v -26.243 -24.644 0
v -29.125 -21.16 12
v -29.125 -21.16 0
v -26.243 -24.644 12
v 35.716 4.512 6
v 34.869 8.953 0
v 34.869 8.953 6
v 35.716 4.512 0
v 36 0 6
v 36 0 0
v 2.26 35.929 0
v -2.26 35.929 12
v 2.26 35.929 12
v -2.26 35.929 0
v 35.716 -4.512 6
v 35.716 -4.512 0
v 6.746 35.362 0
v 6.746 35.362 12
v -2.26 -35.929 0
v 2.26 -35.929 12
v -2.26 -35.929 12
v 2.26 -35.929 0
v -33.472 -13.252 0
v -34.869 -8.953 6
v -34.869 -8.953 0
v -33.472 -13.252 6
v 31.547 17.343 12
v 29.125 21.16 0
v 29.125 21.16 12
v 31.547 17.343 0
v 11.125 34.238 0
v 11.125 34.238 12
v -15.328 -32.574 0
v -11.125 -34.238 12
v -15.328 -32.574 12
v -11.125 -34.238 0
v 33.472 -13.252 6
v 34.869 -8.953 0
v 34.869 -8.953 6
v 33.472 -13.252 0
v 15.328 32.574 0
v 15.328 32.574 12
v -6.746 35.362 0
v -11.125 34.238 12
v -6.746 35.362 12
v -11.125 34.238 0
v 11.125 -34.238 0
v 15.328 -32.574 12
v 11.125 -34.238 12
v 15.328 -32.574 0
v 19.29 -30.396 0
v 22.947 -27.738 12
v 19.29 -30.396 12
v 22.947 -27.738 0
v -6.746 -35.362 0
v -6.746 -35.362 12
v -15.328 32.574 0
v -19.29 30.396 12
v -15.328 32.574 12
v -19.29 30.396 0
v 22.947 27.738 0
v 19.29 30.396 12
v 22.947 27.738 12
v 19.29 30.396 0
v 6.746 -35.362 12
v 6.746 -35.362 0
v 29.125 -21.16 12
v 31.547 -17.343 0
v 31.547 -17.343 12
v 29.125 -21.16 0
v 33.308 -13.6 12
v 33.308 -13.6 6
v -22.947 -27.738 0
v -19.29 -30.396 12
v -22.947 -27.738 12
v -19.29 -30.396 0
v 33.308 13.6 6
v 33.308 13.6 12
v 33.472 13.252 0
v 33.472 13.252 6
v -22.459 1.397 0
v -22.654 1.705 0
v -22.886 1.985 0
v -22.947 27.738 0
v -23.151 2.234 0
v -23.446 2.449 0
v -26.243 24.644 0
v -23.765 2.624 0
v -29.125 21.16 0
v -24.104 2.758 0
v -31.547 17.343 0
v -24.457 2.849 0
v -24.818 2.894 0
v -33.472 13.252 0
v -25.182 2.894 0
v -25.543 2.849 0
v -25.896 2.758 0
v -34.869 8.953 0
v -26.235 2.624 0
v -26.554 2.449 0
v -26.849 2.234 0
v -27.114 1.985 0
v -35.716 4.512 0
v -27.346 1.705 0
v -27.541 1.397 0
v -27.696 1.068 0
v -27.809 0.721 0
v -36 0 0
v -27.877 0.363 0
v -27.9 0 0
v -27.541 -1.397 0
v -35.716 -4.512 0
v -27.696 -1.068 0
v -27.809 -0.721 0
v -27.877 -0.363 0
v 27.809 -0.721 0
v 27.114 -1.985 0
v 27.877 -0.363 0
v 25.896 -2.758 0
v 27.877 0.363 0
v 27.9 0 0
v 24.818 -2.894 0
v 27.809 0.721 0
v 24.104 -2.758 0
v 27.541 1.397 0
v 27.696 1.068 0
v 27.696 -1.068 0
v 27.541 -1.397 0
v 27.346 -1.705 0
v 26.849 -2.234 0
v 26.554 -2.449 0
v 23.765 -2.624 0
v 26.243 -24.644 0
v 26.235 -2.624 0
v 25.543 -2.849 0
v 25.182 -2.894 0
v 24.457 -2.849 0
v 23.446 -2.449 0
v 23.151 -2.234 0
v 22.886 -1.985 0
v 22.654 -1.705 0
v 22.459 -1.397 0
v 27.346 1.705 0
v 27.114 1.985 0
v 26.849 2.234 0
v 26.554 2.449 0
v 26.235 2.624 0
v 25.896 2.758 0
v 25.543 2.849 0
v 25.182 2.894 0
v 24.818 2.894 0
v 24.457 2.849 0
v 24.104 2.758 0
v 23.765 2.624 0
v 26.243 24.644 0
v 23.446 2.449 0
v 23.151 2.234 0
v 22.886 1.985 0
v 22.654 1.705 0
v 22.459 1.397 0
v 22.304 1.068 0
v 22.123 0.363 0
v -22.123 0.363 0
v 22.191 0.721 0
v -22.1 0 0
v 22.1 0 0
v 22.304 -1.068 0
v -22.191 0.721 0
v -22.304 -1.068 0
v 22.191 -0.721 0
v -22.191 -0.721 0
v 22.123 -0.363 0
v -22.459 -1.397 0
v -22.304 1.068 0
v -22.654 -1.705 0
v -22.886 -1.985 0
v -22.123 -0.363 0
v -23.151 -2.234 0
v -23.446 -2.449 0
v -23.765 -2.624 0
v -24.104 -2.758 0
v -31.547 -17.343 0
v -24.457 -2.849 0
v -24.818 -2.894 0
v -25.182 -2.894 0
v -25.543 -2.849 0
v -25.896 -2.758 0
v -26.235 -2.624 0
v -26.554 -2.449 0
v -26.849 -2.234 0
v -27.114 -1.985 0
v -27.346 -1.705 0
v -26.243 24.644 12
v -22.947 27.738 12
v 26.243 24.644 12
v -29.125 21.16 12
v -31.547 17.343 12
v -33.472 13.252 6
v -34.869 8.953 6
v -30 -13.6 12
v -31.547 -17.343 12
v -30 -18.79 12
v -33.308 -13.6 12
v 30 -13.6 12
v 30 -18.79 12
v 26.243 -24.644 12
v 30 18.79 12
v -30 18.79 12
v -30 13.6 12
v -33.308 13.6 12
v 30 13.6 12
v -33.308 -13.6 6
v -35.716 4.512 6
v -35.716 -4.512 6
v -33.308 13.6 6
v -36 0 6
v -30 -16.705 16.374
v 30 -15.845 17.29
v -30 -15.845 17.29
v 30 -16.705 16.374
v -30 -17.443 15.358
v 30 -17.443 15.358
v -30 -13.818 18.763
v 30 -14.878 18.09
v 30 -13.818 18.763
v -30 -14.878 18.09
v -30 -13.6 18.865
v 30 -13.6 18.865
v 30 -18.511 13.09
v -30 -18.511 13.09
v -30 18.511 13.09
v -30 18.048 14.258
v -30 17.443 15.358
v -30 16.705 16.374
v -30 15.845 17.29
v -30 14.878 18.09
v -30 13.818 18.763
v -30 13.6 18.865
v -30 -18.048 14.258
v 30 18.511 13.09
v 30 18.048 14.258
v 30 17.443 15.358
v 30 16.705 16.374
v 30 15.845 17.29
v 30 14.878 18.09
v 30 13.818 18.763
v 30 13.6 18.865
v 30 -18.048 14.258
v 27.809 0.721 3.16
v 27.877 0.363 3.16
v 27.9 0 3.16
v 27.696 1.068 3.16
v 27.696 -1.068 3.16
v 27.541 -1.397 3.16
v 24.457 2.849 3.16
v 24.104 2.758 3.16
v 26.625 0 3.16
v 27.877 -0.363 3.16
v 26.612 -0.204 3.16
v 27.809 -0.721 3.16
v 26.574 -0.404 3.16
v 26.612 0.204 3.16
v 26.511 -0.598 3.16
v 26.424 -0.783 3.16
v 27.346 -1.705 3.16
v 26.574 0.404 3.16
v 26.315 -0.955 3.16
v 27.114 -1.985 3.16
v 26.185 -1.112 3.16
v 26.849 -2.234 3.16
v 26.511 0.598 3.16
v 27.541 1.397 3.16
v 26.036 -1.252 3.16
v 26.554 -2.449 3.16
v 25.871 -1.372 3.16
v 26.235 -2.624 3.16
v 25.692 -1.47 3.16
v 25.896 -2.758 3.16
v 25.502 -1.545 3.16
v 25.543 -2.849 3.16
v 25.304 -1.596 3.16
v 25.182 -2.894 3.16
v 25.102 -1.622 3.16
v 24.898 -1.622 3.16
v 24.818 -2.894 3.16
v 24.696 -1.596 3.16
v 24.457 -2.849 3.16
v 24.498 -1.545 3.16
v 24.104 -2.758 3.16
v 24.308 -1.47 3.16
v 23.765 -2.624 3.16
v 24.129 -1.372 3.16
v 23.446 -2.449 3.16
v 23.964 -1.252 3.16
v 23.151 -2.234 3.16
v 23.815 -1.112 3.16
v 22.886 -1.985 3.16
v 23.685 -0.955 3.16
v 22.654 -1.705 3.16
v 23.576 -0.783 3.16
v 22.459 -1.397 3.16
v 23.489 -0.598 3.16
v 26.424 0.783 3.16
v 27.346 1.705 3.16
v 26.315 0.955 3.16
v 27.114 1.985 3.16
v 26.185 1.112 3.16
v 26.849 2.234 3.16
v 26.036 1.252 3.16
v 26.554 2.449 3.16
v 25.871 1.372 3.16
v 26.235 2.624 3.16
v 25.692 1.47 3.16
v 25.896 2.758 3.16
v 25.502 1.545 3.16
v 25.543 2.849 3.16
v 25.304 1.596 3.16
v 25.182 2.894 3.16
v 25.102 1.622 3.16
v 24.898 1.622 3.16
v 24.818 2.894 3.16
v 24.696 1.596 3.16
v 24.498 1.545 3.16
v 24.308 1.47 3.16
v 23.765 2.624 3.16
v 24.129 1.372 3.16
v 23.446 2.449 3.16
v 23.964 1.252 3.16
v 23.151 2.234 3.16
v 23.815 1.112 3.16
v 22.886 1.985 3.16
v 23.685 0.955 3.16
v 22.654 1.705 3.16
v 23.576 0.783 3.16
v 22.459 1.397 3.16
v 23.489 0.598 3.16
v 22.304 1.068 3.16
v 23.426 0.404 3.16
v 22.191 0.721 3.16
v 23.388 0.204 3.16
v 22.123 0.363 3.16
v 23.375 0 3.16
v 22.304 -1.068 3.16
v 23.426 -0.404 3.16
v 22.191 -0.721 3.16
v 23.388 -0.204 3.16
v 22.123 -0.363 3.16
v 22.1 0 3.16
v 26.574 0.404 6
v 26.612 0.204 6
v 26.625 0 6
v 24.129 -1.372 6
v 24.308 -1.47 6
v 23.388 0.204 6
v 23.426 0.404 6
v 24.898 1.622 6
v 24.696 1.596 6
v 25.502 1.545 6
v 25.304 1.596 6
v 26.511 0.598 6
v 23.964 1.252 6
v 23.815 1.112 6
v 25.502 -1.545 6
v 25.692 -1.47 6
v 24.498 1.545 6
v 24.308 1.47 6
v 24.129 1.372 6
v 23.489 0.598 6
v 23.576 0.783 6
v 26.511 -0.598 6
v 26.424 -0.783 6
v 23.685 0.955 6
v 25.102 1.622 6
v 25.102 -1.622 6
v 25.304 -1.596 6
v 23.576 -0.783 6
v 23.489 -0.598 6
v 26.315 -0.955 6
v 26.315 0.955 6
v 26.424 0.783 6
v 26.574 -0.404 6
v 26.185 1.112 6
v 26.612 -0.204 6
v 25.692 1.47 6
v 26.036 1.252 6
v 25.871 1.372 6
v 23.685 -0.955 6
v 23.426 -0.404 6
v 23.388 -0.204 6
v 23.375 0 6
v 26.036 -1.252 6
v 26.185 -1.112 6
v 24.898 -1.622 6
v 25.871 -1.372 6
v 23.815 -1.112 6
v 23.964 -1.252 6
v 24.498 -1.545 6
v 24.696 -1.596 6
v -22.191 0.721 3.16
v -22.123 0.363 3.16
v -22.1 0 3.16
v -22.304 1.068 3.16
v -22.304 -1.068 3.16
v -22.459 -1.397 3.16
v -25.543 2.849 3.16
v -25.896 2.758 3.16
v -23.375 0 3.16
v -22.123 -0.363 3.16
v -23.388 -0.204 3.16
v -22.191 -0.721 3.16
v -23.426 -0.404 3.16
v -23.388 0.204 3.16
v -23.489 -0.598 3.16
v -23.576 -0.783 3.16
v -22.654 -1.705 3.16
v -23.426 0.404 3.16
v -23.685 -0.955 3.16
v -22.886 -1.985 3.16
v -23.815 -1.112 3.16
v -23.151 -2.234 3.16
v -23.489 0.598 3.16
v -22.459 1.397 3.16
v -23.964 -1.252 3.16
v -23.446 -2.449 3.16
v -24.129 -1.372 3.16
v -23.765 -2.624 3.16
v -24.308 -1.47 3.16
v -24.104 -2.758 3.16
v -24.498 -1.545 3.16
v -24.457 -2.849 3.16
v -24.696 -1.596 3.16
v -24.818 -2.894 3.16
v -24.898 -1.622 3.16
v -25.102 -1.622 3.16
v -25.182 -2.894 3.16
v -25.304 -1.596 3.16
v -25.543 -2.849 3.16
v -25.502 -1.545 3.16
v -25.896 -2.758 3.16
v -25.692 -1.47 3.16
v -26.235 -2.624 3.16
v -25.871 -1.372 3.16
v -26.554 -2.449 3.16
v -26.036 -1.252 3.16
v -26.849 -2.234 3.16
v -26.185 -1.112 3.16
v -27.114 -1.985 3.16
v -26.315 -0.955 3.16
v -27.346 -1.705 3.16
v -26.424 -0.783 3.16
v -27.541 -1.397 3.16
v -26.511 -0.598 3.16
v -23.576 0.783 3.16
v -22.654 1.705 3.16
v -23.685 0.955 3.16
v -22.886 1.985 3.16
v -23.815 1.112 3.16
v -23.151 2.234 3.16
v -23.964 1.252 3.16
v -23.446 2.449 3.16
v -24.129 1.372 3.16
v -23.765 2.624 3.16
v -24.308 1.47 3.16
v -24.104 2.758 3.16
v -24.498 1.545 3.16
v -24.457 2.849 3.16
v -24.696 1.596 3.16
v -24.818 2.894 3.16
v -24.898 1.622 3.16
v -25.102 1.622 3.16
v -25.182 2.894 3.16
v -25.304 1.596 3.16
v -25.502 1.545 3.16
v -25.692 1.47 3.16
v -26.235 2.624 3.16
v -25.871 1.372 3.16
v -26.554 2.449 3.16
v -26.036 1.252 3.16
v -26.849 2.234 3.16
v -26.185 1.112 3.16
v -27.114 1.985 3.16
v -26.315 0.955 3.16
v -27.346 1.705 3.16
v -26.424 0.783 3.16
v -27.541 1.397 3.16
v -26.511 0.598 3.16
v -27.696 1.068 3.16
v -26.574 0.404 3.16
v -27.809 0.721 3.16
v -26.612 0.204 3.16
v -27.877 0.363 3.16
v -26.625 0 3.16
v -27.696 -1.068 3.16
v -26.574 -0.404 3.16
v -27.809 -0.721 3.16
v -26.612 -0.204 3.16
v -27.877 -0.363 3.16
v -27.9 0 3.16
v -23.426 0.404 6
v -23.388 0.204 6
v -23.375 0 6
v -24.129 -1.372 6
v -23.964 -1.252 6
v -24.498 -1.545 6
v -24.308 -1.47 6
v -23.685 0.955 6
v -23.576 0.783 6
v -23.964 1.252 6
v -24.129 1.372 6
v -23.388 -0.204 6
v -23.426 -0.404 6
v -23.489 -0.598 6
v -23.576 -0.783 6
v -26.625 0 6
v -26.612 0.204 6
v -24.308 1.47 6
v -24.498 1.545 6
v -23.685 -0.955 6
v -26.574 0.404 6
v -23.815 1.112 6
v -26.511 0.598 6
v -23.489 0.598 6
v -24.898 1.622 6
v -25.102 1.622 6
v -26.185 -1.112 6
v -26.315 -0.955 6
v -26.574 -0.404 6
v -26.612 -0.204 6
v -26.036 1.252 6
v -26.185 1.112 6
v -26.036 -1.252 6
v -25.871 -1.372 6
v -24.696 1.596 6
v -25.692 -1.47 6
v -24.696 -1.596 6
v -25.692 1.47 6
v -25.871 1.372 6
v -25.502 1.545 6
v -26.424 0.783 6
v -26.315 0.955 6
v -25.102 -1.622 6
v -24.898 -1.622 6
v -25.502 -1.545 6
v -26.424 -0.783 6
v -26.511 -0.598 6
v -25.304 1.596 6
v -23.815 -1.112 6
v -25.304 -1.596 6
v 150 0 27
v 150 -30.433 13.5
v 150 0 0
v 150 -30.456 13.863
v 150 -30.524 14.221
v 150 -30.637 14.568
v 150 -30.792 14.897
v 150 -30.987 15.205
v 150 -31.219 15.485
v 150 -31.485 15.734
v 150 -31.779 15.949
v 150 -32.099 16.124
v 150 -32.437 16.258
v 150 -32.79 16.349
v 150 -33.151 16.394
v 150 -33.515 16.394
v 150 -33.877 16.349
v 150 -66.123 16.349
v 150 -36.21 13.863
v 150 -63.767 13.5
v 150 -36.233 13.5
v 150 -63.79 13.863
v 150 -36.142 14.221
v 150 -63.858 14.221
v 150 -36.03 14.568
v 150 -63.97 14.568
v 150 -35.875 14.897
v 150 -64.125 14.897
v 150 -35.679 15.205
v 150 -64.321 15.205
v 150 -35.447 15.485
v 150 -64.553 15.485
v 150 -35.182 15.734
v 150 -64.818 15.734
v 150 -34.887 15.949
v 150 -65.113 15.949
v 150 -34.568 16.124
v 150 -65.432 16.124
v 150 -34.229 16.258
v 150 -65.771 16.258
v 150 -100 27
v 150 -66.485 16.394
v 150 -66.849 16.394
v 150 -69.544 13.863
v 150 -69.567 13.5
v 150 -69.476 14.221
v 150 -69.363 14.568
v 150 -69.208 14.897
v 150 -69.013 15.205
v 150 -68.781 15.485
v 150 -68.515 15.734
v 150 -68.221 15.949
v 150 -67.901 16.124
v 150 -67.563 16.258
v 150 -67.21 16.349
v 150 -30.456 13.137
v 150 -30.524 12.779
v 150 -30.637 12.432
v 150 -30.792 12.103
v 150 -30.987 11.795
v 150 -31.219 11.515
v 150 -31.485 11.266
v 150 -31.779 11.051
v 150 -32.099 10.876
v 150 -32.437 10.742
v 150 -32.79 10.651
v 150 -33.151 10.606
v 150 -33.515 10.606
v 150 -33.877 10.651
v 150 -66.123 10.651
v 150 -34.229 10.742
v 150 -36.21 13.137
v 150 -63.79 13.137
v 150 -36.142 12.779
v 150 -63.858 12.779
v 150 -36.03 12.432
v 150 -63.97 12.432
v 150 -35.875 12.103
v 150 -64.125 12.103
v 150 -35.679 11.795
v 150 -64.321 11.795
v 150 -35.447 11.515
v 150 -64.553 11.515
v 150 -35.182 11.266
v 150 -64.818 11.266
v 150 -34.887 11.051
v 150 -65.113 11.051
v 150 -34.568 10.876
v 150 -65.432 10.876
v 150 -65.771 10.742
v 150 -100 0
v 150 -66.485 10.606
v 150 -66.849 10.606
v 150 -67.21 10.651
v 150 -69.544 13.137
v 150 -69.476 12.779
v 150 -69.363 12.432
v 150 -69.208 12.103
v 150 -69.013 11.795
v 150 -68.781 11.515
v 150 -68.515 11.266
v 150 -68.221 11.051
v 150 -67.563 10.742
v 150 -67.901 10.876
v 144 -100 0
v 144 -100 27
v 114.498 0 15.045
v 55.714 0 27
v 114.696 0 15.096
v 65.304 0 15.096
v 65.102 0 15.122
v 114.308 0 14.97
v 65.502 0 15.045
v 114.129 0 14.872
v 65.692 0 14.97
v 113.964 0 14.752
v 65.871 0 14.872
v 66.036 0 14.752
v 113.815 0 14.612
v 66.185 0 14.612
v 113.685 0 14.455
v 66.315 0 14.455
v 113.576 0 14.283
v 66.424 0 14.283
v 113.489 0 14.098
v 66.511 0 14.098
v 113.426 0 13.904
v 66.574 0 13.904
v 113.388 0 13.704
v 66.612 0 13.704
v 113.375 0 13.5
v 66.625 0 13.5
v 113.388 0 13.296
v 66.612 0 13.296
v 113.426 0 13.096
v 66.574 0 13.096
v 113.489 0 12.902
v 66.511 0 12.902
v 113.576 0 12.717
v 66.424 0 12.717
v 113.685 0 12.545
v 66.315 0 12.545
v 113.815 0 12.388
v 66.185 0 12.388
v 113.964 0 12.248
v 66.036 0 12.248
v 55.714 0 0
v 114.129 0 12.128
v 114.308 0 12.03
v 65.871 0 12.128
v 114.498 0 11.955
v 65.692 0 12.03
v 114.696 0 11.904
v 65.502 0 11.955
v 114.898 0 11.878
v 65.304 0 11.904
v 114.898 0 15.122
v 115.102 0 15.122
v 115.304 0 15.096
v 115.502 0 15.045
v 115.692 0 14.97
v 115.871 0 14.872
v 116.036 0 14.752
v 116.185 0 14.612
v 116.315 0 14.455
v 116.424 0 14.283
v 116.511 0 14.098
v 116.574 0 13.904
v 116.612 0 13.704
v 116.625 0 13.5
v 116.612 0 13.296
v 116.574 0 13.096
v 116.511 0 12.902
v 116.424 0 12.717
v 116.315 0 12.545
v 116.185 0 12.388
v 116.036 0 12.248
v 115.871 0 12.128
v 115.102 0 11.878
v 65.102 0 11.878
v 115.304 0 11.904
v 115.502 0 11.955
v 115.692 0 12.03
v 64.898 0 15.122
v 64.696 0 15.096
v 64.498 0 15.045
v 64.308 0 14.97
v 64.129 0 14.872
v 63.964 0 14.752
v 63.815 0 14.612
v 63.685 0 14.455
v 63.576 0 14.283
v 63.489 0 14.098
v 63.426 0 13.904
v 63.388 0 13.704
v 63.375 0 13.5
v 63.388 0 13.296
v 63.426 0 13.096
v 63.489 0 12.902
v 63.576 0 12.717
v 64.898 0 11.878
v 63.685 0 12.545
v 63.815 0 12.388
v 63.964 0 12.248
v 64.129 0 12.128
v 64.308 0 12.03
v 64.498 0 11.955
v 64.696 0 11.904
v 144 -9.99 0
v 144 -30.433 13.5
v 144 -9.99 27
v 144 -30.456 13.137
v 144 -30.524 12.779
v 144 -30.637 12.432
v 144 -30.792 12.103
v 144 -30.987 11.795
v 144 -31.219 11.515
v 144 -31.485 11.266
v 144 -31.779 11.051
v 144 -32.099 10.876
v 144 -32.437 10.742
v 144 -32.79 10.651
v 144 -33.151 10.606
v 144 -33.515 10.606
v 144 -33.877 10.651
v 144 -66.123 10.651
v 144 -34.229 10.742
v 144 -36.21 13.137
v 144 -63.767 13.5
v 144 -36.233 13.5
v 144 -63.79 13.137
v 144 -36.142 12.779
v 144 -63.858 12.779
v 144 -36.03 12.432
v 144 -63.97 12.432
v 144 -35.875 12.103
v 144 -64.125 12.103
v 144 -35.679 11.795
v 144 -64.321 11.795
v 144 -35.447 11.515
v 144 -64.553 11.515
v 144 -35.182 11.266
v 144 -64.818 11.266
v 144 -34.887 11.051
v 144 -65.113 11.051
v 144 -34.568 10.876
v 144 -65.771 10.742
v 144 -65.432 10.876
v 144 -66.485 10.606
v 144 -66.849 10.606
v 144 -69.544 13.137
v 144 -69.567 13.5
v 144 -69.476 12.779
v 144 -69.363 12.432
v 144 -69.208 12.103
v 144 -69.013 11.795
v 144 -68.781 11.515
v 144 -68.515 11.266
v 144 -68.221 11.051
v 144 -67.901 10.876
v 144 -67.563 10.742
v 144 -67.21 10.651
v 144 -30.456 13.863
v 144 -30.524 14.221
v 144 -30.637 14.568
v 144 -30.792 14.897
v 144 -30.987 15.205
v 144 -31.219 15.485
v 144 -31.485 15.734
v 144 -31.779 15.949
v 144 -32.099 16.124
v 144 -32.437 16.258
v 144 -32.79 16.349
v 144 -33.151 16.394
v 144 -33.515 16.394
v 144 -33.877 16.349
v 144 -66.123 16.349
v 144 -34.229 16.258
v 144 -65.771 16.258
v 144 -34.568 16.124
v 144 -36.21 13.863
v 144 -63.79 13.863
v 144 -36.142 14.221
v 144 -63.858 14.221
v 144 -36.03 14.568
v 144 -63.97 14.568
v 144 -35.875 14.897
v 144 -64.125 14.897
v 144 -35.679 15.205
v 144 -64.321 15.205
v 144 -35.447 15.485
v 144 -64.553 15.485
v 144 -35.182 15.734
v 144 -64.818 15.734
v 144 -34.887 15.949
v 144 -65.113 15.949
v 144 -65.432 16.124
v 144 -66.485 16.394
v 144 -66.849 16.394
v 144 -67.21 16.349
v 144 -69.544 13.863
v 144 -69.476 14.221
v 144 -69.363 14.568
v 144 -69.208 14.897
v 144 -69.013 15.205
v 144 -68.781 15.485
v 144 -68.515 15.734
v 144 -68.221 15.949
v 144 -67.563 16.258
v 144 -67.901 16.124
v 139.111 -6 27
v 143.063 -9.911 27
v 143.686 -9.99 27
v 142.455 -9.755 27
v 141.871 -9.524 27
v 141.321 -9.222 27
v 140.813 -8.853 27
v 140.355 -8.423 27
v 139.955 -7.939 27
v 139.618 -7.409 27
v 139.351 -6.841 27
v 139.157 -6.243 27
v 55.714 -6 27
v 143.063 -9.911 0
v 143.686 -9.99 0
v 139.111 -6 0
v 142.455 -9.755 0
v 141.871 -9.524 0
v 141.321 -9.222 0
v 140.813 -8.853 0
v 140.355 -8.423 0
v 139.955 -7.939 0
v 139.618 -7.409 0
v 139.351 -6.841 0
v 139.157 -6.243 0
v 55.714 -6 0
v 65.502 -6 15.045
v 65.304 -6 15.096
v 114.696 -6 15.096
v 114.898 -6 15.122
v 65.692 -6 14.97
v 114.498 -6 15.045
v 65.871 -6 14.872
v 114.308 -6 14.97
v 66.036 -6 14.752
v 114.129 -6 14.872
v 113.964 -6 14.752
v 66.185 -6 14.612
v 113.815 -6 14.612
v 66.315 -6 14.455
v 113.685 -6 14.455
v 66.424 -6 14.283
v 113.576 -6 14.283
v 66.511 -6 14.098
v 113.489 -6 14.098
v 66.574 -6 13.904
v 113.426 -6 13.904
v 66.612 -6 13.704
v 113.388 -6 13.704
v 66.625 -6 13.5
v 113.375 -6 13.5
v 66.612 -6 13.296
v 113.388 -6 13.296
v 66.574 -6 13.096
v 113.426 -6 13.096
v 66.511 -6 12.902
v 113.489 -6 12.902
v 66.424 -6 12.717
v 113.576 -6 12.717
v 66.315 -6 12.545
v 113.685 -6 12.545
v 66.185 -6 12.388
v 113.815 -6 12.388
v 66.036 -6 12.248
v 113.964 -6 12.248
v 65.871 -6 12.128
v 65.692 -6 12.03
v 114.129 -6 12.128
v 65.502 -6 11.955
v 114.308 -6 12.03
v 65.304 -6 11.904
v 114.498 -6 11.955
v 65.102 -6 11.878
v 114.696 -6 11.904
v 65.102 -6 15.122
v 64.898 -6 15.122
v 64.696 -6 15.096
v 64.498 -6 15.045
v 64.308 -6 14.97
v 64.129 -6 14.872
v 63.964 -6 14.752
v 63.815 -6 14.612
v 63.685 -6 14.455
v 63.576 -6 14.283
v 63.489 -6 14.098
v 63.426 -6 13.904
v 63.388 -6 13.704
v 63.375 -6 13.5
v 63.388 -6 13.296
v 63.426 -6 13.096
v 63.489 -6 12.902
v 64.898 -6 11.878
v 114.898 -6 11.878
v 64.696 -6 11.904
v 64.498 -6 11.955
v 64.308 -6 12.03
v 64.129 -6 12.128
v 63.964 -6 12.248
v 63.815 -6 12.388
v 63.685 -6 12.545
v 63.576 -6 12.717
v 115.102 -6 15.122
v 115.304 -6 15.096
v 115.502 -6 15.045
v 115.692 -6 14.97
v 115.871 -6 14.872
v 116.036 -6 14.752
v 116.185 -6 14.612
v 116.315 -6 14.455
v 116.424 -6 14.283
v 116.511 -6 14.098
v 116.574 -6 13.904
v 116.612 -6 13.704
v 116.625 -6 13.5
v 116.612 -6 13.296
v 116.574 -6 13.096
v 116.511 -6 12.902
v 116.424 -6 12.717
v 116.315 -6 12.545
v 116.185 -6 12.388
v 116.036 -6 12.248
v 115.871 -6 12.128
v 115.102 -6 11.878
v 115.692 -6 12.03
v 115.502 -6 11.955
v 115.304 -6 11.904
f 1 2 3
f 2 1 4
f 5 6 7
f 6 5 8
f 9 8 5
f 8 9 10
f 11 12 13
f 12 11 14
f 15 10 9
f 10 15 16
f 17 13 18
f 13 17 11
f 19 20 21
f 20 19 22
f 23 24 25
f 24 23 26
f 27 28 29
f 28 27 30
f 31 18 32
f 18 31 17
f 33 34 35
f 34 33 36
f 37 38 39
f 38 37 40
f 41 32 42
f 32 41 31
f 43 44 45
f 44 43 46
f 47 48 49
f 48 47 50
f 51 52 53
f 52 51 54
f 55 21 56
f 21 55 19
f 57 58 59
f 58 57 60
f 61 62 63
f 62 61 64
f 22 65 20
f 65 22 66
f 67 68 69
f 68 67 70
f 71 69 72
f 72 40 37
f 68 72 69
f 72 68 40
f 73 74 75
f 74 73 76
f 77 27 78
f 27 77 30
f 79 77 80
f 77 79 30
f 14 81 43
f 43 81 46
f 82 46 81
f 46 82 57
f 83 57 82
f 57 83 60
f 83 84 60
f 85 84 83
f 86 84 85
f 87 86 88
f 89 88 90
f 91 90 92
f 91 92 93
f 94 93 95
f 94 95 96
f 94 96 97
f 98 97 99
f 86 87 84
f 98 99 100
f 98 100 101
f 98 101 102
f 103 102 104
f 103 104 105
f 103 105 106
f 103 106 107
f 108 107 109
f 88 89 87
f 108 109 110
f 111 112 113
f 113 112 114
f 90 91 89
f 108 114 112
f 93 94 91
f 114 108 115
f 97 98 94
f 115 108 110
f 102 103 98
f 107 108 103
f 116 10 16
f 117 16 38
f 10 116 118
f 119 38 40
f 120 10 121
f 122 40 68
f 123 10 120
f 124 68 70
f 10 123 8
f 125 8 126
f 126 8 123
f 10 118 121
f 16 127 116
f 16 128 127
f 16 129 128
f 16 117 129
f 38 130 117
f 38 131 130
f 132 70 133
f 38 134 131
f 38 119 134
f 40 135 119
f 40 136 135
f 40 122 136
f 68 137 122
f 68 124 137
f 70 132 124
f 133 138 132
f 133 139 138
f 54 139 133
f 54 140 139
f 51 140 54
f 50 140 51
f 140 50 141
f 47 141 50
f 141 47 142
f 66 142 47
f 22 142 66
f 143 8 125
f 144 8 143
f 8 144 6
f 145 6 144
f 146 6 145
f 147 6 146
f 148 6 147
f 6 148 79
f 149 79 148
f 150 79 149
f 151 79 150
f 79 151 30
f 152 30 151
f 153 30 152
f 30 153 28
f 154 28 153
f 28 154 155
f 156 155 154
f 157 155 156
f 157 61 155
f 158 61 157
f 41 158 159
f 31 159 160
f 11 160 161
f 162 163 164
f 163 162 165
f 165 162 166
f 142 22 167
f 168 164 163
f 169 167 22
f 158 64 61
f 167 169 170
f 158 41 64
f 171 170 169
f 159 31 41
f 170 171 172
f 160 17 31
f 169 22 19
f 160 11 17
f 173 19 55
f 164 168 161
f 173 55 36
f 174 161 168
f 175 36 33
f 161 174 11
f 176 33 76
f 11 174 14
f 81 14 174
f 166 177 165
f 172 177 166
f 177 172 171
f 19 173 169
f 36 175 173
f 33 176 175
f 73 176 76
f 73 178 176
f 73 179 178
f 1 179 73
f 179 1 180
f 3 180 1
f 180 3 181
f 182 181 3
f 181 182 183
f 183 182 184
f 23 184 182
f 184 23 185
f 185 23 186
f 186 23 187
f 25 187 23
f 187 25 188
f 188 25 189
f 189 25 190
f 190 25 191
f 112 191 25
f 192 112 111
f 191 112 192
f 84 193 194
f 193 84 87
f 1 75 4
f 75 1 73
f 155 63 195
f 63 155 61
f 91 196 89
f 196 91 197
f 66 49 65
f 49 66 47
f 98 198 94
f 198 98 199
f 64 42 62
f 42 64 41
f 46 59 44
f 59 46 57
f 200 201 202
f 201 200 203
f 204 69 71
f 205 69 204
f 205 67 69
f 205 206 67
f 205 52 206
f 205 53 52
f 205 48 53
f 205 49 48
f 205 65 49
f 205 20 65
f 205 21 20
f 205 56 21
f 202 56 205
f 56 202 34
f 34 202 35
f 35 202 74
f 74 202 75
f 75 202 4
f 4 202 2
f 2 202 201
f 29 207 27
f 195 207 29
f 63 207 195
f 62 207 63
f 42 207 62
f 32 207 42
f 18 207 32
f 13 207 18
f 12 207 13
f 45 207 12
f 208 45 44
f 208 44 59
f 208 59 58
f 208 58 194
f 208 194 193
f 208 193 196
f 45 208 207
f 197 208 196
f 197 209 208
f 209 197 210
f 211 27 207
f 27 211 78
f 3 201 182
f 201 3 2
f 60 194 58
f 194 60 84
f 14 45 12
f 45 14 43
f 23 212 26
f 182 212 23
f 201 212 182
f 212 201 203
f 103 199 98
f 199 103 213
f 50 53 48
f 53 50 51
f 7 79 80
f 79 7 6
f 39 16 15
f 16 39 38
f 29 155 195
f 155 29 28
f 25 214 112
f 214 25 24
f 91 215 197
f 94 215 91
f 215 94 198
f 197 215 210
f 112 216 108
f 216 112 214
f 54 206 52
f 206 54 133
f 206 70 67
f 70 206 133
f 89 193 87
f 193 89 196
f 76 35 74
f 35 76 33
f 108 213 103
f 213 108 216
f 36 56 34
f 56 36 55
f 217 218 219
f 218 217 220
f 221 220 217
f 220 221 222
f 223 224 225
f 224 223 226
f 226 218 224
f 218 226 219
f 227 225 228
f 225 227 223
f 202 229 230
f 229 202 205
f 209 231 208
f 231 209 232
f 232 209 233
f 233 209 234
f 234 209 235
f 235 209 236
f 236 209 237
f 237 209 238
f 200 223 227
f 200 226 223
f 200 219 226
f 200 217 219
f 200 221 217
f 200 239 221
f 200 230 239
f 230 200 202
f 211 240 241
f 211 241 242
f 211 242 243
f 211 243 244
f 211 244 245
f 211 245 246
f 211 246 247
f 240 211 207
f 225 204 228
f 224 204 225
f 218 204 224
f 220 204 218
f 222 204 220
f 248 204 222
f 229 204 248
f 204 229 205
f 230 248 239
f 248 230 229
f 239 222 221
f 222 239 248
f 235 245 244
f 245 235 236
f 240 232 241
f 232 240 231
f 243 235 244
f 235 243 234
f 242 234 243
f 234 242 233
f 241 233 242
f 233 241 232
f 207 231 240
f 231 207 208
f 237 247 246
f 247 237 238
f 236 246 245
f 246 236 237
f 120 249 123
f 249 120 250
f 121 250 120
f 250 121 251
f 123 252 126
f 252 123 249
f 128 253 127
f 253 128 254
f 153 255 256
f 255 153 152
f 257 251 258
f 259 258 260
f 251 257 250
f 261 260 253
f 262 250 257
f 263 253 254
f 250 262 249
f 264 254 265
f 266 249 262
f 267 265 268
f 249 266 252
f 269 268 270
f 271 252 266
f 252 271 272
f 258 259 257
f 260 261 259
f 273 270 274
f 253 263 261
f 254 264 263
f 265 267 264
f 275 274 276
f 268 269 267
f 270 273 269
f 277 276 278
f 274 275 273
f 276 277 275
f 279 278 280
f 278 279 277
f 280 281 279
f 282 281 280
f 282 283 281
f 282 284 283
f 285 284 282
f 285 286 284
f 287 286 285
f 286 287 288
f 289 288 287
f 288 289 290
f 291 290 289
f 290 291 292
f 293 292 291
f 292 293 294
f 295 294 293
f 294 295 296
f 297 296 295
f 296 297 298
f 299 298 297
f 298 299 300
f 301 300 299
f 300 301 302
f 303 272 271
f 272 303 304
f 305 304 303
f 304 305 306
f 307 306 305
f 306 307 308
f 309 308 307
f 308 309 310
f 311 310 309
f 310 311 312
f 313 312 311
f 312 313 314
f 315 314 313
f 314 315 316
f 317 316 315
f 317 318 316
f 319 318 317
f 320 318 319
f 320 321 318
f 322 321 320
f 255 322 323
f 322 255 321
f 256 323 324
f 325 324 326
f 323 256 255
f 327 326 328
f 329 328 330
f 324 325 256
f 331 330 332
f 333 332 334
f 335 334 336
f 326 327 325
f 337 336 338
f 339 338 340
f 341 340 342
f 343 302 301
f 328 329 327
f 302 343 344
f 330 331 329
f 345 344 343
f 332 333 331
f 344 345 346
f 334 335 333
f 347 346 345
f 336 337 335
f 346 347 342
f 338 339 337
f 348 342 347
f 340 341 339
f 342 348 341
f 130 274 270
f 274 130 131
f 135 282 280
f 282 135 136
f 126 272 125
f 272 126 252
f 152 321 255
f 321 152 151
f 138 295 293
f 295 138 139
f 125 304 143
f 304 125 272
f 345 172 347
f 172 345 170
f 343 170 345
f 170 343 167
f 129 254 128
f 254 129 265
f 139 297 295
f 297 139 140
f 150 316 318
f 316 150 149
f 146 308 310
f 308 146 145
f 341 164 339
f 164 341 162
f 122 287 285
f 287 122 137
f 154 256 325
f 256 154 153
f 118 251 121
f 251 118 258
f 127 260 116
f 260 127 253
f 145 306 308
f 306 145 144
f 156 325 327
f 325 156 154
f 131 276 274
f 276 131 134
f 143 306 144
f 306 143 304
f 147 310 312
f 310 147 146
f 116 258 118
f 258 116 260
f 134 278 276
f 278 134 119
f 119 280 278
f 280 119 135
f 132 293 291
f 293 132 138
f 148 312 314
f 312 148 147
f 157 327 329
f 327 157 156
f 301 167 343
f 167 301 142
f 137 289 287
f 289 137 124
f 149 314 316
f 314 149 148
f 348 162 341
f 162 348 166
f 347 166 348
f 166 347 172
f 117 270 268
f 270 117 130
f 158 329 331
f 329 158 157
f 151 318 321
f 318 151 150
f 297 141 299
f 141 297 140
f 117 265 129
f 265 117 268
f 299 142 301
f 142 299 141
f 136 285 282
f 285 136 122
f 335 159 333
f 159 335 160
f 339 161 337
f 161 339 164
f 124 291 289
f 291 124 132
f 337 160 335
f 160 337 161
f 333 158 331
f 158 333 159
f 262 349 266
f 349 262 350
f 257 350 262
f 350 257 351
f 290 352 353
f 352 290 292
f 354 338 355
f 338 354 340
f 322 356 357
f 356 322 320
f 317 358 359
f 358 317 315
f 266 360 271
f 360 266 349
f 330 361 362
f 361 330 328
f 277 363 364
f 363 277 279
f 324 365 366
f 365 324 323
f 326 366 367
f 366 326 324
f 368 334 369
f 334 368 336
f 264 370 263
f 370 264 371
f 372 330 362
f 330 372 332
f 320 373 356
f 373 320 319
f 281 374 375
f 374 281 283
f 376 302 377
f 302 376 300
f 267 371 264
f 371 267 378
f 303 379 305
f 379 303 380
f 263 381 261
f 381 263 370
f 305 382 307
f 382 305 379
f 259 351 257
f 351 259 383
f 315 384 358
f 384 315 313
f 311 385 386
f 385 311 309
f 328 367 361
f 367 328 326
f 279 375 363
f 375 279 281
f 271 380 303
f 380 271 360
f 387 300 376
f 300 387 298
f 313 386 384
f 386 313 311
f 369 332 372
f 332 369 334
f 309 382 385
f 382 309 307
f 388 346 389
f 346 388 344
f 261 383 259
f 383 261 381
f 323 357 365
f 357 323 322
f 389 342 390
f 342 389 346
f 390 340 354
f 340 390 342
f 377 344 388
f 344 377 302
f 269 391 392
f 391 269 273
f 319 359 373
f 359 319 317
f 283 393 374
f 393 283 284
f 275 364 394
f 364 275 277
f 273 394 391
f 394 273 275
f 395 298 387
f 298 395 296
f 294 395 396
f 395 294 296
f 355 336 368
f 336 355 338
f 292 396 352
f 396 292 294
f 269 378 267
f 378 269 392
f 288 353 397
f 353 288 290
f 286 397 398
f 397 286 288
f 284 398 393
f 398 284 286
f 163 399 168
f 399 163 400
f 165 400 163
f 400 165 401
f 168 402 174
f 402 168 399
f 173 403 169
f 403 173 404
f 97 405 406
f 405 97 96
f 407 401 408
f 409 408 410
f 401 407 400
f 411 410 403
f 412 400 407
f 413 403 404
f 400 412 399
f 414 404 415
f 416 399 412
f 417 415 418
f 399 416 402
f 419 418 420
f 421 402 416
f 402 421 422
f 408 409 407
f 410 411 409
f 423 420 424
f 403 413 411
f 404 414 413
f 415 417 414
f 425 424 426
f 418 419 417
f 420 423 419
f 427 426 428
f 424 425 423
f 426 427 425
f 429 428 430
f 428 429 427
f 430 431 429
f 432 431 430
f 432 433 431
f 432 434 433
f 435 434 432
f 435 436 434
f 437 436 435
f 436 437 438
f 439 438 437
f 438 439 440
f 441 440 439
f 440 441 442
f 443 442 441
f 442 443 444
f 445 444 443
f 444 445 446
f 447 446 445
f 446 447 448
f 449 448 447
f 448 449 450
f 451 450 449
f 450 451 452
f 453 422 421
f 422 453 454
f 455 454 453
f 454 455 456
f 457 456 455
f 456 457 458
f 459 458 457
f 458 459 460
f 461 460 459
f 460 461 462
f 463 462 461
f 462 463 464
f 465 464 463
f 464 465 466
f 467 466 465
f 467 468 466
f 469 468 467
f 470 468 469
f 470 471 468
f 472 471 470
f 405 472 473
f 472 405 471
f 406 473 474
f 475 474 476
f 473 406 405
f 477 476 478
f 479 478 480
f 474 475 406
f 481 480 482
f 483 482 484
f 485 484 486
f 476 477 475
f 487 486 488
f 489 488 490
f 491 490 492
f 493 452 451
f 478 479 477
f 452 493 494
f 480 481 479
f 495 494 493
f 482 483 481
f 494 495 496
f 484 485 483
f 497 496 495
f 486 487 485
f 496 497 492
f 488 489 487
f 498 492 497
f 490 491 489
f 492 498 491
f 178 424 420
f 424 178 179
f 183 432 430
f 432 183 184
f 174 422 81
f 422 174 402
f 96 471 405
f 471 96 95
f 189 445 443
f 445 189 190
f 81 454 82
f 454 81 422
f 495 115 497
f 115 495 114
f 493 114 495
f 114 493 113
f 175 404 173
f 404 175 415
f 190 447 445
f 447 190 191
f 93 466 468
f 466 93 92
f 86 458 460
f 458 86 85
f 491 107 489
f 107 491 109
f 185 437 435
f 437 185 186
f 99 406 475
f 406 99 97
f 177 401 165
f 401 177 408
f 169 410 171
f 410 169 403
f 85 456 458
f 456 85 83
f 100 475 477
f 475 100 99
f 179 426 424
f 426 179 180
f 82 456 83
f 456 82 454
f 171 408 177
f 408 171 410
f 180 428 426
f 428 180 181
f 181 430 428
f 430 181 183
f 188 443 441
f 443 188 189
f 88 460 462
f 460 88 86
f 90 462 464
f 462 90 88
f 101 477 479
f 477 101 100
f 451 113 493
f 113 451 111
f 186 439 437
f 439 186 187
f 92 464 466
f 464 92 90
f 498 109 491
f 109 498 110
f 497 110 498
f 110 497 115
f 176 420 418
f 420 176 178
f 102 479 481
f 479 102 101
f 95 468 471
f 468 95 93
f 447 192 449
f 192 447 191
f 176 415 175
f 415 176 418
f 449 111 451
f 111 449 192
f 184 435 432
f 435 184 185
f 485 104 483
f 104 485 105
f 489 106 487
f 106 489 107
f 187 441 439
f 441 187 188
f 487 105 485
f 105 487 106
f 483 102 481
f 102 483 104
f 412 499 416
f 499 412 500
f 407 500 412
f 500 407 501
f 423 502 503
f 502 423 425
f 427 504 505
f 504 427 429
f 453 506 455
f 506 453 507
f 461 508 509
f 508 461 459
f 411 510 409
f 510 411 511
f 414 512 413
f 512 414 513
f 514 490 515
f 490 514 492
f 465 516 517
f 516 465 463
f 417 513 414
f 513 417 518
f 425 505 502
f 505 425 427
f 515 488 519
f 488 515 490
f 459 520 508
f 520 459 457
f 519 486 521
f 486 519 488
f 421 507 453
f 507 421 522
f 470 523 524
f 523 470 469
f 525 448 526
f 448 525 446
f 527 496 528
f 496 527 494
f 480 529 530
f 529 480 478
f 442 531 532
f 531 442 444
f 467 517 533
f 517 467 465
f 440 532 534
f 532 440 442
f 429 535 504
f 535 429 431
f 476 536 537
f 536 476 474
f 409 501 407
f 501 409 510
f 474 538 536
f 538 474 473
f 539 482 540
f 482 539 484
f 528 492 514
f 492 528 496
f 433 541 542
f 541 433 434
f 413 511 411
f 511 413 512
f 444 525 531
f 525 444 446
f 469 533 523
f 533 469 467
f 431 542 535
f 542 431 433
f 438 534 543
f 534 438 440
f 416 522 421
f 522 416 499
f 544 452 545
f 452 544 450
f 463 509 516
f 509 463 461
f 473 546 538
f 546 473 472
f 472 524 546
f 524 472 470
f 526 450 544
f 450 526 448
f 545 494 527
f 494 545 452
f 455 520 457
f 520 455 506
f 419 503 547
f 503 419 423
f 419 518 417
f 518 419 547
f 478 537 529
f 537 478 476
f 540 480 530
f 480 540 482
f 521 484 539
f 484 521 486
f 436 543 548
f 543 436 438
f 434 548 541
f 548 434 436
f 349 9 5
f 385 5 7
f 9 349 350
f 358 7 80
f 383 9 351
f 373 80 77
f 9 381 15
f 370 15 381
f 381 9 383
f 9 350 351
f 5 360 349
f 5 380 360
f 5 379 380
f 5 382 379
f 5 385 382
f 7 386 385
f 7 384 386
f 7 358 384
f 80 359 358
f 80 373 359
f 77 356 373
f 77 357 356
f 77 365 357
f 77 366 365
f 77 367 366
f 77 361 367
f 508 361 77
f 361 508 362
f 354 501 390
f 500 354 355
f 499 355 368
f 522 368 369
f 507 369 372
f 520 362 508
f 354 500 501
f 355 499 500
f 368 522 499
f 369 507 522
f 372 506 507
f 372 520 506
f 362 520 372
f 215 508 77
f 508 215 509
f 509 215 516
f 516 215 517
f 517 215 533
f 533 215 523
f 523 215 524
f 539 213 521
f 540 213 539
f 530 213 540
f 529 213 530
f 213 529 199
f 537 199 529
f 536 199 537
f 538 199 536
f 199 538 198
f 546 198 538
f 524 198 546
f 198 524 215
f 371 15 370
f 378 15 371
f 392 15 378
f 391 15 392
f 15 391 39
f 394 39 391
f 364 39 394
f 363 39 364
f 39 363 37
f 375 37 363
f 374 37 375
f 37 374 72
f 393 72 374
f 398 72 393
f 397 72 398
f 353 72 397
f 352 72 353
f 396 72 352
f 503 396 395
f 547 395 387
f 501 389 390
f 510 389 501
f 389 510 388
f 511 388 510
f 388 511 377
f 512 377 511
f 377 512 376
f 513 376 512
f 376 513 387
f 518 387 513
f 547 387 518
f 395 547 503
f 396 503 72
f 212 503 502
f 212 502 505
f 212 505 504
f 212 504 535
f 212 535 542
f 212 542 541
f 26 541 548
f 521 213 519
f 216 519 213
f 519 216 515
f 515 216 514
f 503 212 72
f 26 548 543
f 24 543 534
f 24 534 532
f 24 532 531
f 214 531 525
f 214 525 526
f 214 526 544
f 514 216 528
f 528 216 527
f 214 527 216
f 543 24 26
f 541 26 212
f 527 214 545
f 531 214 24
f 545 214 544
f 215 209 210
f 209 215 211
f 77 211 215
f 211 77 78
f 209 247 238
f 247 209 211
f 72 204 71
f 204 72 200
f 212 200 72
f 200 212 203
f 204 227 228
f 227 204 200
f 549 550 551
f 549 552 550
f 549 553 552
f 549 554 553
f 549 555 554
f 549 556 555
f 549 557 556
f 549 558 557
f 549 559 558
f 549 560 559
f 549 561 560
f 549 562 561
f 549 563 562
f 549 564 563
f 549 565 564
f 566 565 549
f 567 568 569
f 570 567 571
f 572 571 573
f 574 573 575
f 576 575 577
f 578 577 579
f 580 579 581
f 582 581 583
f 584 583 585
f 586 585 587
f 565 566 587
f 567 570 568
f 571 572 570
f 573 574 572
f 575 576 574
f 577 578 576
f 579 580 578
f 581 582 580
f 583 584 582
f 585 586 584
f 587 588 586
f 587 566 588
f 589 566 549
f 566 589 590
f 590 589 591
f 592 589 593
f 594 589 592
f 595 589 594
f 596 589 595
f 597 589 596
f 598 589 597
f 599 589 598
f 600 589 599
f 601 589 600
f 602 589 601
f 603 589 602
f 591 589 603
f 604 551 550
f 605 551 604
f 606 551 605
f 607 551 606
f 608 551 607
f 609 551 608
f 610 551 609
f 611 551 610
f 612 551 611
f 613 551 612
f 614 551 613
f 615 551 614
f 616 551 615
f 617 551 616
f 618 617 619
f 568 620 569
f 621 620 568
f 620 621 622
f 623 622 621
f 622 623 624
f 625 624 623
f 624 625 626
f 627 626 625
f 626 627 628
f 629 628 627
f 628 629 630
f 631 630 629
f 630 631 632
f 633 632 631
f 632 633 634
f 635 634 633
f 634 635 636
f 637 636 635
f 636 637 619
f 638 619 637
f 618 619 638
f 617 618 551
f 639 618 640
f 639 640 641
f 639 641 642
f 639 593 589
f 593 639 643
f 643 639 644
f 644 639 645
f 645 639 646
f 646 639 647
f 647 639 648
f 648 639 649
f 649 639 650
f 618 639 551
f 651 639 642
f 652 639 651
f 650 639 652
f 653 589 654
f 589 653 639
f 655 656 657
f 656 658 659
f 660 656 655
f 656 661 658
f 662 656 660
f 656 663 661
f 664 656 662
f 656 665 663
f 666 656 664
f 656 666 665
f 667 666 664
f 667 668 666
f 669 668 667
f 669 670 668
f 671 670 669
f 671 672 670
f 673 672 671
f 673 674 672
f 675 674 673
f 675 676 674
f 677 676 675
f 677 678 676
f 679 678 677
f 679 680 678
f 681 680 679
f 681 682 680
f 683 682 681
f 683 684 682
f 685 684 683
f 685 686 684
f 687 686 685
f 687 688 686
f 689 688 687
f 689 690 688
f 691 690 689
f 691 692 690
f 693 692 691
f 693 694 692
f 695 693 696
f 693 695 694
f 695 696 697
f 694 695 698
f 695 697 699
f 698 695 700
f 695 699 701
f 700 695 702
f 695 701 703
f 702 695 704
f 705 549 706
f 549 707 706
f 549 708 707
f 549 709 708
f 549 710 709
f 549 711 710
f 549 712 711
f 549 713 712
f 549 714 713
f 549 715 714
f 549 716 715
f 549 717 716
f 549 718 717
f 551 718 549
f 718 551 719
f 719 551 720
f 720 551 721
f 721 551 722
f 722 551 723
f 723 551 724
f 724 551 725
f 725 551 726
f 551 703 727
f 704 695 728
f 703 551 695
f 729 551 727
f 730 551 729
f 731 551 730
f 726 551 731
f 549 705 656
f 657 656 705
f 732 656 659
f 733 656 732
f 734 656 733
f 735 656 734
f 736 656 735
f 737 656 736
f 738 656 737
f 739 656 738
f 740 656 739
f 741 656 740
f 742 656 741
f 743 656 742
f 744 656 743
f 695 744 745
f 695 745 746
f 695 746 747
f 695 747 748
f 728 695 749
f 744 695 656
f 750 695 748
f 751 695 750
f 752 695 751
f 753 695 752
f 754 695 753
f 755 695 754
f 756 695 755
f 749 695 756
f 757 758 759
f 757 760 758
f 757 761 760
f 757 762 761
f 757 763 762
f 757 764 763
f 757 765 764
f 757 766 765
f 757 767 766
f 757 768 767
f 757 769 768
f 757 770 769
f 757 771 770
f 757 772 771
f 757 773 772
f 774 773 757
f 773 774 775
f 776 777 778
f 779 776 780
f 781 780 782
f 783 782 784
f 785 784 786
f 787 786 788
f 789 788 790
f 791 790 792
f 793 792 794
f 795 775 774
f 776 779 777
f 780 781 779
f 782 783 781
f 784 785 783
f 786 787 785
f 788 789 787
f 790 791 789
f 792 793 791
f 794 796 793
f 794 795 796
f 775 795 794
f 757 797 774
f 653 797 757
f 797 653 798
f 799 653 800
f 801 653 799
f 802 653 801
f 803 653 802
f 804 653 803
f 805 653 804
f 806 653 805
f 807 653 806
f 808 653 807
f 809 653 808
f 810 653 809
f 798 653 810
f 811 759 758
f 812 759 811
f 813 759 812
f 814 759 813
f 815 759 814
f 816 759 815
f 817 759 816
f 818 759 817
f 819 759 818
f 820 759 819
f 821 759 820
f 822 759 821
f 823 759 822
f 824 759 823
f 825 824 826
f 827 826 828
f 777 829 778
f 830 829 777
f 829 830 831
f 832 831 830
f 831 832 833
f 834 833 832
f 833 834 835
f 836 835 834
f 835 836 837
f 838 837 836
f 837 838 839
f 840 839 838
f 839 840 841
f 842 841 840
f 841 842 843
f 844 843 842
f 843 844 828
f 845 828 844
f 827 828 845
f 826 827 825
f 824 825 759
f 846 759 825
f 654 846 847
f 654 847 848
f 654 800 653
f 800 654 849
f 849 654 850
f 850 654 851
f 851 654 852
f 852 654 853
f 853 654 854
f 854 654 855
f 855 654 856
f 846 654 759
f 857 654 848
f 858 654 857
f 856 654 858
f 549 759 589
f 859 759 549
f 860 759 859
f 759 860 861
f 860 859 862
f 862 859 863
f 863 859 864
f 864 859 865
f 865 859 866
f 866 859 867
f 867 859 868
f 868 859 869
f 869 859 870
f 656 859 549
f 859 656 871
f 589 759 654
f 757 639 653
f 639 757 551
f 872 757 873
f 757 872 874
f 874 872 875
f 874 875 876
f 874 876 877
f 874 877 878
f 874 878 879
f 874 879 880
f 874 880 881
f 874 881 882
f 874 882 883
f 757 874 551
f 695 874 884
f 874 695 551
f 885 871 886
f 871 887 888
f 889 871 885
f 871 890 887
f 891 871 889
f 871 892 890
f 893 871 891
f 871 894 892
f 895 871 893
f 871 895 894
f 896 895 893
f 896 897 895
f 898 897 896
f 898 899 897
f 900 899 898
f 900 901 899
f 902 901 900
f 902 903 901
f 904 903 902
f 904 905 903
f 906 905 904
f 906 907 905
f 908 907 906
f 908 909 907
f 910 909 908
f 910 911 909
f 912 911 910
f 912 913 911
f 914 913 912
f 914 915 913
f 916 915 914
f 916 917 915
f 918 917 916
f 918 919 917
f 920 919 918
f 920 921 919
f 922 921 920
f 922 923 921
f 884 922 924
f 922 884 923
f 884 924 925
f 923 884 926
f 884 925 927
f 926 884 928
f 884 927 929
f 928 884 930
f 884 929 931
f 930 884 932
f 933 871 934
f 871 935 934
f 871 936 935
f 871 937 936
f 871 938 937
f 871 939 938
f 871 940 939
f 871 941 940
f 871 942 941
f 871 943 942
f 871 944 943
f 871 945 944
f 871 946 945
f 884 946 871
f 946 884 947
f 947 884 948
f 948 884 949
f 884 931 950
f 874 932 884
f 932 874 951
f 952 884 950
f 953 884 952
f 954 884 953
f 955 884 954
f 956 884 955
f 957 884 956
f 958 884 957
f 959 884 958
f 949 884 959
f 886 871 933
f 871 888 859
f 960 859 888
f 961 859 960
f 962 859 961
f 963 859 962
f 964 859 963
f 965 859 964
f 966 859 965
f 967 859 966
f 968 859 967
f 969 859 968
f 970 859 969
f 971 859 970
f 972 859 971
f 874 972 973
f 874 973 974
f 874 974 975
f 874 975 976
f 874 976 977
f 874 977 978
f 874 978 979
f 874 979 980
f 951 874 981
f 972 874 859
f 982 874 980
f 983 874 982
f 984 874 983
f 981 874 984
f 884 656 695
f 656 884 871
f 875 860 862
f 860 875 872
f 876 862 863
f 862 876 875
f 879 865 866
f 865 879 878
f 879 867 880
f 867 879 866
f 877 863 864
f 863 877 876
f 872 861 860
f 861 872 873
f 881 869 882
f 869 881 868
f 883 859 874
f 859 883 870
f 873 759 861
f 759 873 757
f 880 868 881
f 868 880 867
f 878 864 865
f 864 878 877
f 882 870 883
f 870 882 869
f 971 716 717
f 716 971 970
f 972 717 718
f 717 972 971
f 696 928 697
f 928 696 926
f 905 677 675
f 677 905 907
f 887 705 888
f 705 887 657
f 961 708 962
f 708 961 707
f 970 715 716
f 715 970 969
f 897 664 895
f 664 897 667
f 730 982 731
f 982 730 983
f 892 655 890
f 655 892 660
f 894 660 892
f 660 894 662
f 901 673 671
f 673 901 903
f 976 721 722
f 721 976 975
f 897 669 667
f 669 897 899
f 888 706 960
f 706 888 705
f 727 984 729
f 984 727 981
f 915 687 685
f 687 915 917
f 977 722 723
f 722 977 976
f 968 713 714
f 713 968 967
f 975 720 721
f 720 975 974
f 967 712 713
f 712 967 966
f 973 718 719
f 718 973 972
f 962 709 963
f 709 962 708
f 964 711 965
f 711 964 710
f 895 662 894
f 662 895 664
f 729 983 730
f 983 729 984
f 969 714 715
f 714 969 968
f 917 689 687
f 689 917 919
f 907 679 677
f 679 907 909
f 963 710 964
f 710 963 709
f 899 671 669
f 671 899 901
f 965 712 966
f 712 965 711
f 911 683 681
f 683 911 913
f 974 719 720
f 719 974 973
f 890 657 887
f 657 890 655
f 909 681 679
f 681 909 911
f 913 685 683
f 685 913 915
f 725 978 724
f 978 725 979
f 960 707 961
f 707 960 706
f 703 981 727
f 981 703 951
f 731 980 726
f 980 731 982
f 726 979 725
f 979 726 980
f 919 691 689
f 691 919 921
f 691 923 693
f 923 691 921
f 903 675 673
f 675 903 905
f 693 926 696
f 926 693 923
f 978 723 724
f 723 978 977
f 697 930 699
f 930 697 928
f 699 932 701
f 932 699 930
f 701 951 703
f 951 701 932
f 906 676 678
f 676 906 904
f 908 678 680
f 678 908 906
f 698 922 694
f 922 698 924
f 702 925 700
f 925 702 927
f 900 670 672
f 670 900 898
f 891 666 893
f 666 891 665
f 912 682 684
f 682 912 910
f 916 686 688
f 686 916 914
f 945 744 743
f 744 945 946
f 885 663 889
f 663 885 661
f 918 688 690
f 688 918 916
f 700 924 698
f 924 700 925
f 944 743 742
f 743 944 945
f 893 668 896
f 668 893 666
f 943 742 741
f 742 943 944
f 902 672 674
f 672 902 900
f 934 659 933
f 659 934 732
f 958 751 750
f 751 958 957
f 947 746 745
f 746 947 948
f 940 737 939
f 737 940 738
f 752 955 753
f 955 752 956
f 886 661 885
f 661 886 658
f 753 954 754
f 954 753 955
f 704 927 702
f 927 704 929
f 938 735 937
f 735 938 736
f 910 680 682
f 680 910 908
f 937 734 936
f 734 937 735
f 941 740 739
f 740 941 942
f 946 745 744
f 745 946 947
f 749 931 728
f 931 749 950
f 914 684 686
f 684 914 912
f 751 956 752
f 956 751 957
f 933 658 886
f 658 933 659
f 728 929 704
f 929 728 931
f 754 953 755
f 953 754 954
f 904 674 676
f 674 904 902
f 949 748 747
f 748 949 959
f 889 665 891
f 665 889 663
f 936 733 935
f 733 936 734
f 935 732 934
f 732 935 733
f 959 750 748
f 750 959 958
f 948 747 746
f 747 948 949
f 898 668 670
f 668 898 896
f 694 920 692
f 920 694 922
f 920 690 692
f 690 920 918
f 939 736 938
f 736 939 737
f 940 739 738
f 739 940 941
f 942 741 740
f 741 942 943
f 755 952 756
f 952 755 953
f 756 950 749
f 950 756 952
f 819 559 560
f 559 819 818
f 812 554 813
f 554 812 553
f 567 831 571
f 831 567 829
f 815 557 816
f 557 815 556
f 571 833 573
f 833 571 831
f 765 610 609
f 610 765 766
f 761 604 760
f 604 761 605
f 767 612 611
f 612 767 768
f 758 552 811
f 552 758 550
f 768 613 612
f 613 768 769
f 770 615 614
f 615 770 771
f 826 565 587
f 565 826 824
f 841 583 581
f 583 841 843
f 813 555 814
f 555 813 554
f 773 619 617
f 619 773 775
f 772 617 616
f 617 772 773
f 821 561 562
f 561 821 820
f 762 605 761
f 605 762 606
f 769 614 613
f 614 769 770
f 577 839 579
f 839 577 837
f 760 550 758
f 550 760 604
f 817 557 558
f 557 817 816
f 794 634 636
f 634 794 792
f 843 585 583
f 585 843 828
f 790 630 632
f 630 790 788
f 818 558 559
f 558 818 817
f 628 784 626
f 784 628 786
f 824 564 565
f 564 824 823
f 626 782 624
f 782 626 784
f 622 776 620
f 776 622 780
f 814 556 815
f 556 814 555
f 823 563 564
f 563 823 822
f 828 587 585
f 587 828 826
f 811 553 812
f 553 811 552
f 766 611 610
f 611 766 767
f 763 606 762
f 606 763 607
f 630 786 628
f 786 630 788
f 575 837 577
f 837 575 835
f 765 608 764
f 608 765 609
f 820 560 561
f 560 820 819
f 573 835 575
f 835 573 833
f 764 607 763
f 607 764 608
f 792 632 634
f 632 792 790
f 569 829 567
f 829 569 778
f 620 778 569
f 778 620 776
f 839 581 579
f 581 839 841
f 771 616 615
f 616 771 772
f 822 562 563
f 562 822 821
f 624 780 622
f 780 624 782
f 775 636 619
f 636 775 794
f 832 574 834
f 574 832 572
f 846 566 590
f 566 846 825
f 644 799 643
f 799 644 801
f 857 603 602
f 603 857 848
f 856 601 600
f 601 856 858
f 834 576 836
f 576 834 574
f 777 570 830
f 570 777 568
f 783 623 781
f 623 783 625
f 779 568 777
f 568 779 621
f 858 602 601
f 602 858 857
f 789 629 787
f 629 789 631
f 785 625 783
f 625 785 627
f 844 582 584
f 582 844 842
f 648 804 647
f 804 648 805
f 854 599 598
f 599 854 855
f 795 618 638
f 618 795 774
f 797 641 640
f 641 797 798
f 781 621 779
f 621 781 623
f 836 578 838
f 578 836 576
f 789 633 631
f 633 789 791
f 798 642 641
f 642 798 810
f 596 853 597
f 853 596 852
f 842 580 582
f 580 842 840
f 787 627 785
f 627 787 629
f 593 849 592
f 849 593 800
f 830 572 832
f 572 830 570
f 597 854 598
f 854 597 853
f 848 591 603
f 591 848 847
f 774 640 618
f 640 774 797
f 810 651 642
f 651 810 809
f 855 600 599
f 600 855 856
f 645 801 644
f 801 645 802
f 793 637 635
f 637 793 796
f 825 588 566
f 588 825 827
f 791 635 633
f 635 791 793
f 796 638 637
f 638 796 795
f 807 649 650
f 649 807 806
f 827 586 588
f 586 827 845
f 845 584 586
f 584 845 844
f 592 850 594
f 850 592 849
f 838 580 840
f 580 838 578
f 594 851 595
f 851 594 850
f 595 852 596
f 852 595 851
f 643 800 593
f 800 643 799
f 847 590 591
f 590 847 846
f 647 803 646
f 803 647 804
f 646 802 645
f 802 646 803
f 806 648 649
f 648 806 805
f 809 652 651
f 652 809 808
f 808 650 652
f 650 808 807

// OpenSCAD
//-----------------------------------------------------------------------------
// Author: Andre Pruitt, andre@pruittfamily.com
// Date:   12/23/2018
//
// This OpenSCAD model create a  AcuRite 06054M Temperature and 
// Humidity Solar Radiation Shield
//
// This work has been dereived from HAMOP's Radiation / Weather shield for 
// Netatmo outdoor sensor on Thingiverse.com: https://www.thingiverse.com/thing:804356/files
//
// This version is coded in OpenSCAD and is easy to modify for any type of temperature
// probe. I have chosen to use M3-0.5 Threaded Heat Set Inserts for 3D Printing rather
// then glueing the parts together. 
//
// For the AcuRite 06054M Temperature and Humidity probe you will need to print
// 1 top section, 5 middle sections and 1 bottom section. 
//
// Change the value of the Model variable to print the different parts of the design
// The values can be "top", "middle" and "bottom"
//
//      ------------
//     /            \           Top Section
//    /              \
//    ----------------
//     /            \   ==  -+
//    /              \  ==   |
//    ----------------  ==   |
//     /            \   ==   |
//    /              \  ==   |
//    ----------------  ==   |  Middle Sections
//     /            \   ==   |   (5 of these)
//    /              \  ==   |
//    ----------------  ==   |
//     /            \   ==   |
//    /              \  ==   |
//    ----------------  ==   |
//     /            \   ==   |
//    /              \  ==   |
//    ----------------  ==  -+
//       =================      Bottom Section
//       =================

$fn=50;

// top, middle (you will need 6 of these), bottom
Model = "bottom";

// Set a few parameters 
ConnectorRadius =  5;
M3Length        = 10;
M3HeadRadius    = 5.40/2 + 0.2;
M3HeadHeight    = 3.15;
M3ShaftRadius   = 2.85/2 + 0.2;
NutRadius       = 4.90/2 - 0.2;
ProbeWidth      = 27;

// Print the requested item
if(Model == "top")
{
     dome(Radius = 30, Top = "true");
  Support(Radius = 30, Angle =   0, Shaft = "yes");
  Support(Radius = 30, Angle =  90, Shaft = "no");
  Support(Radius = 30, Angle = 180, Shaft = "yes");
  Support(Radius = 30, Angle = 270, Shaft = "no");
}
else
if(Model == "middle")
{
     dome(Radius = 30, Top = "False");
  Support(Radius = 30, Angle =   0, Shaft = "yes");
  Support(Radius = 30, Angle =  90, Shaft = "no");
  Support(Radius = 30, Angle = 180, Shaft = "yes");
  Support(Radius = 30, Angle = 270, Shaft = "no");
}
else
if(Model == "bottom")
{
  Bottom(Radius = 30);
}

// This module draws the Support structures
module Support(Radius = 50, Height = 20, Wall = 1, Angle = 0, Shaft = "yes")
{
  // Rotate the object to the specified position
color("yellow"){  rotate([0,0,Angle])
  {
    difference()
    {
      hull()
      {
        // Draw the post
        translate([0, Radius - ConnectorRadius, 0])
          cylinder(r = ConnectorRadius, h = Height);
      
        // Draw the part the connects the post to the wall of the dome
        difference()
        {
          translate([-Wall, Radius - Wall/2, - Wall/2])
            rotate([0, 90, 0])linear_extrude(height = 2 * Wall)
              circle(r = Height); 
      
        // Remove bottom half
        translate([-Wall - 0.1, Radius - Height - Wall/2, -Height - Wall * 1.85]) 
          cube([2 * Wall + 0.2, 2 * Height, Height + 2 * Wall]);
      
        // Remove the last quarter of the circle
        translate([-Wall - 0.1,  Radius - Height - Wall/2, - Wall/2]) 
          cube([2 * Wall + 0.2, Height, Height]);
        }
      }
 
      // Is this where the M3 screw goes or the Brass nut?
      if(Shaft == "yes")
      {
        // Carve out the cylinder for accessing the M3 screw head
        translate([0, Radius - ConnectorRadius, -0.01])
          cylinder(r = M3HeadRadius, h = Height - M3Length / 2 + 0.02);
  
        // Carve out the cylinder for the M3 shaft
        translate([0, Radius - ConnectorRadius, Height - M3Length / 2])
          cylinder(r = M3ShaftRadius, h = M3Length / 2 + 0.02);
      }
      else
      {
        // Carve out a hole to put the brass inset nut into 
        translate([0, Radius - ConnectorRadius, -0.01])
          cylinder(r = NutRadius, h = 5 + 0.02);
  
        // Add a little lip to make it easer to set up the inset nut to be melted in place
        translate([0, Radius - ConnectorRadius, -0.01])
          cylinder(r = NutRadius + 0.25, h = 0.5);
      }
    }
  }
}}

module dome(Radius = 50, Height = 20, Wall = 1, Top = "False")
{
  translate([0,0, Wall ]) // Accounts for the rounded edge on the bottom of the dome
  {
    // Draw the hole thing with a funny hole in the center  
    difference()
    {
      // Draw the upper part of the done with the top cut off
      union()
      {
        // Draw the scopped out dome
        difference()
        {
          translate([0,0, -0.5]) rotate_extrude(convexity = 10)
            translate([Radius, 0, 0]) 
              circle(r = Height);

          translate([0,0, -0.5]) rotate_extrude(convexity = 10)
            translate([Radius - Wall, 0, 0]) 
              circle(r = Height - Wall);
        }
      }
        
      // Remove the bottom part of the drawing
      translate([-2*Radius,-2*Radius,-2*Height + 0.1]) 
        cube([4*Radius,4*Radius, 2*Height]);

      // Draw the hole in the middle
      cylinder(r=Radius, h = Height );
    }

    // Draw the rounded edge on the bottom
    difference()
    {
      color("red")              
        rotate_extrude(convexity = 10)
          translate([Radius + Height - Wall, 0, 0]) 
            circle(r = Wall);

      // Cut off the top of the ring
      translate([-Radius, -Radius, 0]) 
       cube([2*Radius, 2*Radius, Height - Wall /2]);
    }

    if(Top == "true")
      translate([0, 0, Height - 2 * Wall]) cylinder(r = Radius, h = 1.5 * Wall);
  }
}

// Draw the bottom of the house. It includes the mounting bracket
module Bottom(Radius = 50, Height = 6,  Wall = 1)
{
  difference()
  {
    union()
    {
      // Draw the base
      cylinder(r = Radius + Height , h = 2 * Height); // Wall/2 accounts for rounded bottom of dome

       // Draw the mounting braces
       translate([-Radius, -ProbeWidth/3, 10]) rotate([0, 90, 0]) cylinder(r = Radius/3, h = 2 * Radius);
 
       // Draw the mounting braces
       translate([-Radius, ProbeWidth/3, 10]) rotate([0, 90, 0]) cylinder(r = Radius/3, h = 2 * Radius);
    }

    // Carve out the cylinder for accessing the M3 screw head
    translate([Radius - ConnectorRadius, 0, -0.01])
      cylinder(r = M3HeadRadius, h = M3HeadHeight + 0.02);

    // Carve out the shaft
    translate([Radius - ConnectorRadius, 0, 0])
      cylinder(r = M3ShaftRadius, h = Height + 0.01 + Wall/2); // Wall/2 accounts for rounded bottom of dome

    // Carve out the cylinder for accessing the M3 screw head on the other side
    translate([-Radius + ConnectorRadius, 0, -0.01])
      cylinder(r = M3HeadRadius, h = M3HeadHeight + 0.02);

    // Carve out the shaft on the other side
    translate([-Radius + ConnectorRadius, 0, 0])
      cylinder(r = M3ShaftRadius, h = Height + 0.01 + Wall/2); // Wall/2 accounts for rounded bottom of dome

    // Carve out a grove for the horizontal arm
    translate([-2 * Radius, -ProbeWidth/2 - .1, Height]) cube([4 * Radius, ProbeWidth + 0.2, 3*Height]);
  }

  // Draw the mounting arm
  translate([3*Radius, 0, ProbeWidth/2]) rotate([90, 0, 0])
  { 
    difference()
    {
      union()
      {
        // Draw the vertical arm
        translate([2*Radius - Height, -ProbeWidth/2, 0]) cube([Height, ProbeWidth, 100]);
  
        // Draw the horizontal arm
        translate([-Radius - Radius / 7, -ProbeWidth/2, 0]) cube([3 * Radius + Radius / 7, ProbeWidth, Height]);
  
        // Draw the joint support
        translate([2*Radius - Height, ProbeWidth/2, 5]) rotate([90, 0, 0]) cylinder(r = 5, h = ProbeWidth);
      }

      // Carve out the mounting holes on the vertical arm
      translate([Radius - ConnectorRadius, 0, -0.1])
        cylinder(r = M3ShaftRadius, h = Height + 0.02 + Wall/2); // Wall/2 accounts for rounded bottom of dome
  
      translate([-Radius + ConnectorRadius, 0, -0.1])
        cylinder(r = M3ShaftRadius, h = Height + 0.02 + Wall/2); // Wall/2 accounts for rounded bottom of dome
  
      translate([2*Radius - Height - 0.1, 0, 100/3]) rotate([0, 90, 0]) cylinder(r = M3HeadRadius, h = Height + 0.2);
      translate([2*Radius - Height - 0.1, 0, 2 * 100/3]) rotate([0, 90, 0]) cylinder(r = M3HeadRadius, h = Height + 0.2);
    }
  }
}
